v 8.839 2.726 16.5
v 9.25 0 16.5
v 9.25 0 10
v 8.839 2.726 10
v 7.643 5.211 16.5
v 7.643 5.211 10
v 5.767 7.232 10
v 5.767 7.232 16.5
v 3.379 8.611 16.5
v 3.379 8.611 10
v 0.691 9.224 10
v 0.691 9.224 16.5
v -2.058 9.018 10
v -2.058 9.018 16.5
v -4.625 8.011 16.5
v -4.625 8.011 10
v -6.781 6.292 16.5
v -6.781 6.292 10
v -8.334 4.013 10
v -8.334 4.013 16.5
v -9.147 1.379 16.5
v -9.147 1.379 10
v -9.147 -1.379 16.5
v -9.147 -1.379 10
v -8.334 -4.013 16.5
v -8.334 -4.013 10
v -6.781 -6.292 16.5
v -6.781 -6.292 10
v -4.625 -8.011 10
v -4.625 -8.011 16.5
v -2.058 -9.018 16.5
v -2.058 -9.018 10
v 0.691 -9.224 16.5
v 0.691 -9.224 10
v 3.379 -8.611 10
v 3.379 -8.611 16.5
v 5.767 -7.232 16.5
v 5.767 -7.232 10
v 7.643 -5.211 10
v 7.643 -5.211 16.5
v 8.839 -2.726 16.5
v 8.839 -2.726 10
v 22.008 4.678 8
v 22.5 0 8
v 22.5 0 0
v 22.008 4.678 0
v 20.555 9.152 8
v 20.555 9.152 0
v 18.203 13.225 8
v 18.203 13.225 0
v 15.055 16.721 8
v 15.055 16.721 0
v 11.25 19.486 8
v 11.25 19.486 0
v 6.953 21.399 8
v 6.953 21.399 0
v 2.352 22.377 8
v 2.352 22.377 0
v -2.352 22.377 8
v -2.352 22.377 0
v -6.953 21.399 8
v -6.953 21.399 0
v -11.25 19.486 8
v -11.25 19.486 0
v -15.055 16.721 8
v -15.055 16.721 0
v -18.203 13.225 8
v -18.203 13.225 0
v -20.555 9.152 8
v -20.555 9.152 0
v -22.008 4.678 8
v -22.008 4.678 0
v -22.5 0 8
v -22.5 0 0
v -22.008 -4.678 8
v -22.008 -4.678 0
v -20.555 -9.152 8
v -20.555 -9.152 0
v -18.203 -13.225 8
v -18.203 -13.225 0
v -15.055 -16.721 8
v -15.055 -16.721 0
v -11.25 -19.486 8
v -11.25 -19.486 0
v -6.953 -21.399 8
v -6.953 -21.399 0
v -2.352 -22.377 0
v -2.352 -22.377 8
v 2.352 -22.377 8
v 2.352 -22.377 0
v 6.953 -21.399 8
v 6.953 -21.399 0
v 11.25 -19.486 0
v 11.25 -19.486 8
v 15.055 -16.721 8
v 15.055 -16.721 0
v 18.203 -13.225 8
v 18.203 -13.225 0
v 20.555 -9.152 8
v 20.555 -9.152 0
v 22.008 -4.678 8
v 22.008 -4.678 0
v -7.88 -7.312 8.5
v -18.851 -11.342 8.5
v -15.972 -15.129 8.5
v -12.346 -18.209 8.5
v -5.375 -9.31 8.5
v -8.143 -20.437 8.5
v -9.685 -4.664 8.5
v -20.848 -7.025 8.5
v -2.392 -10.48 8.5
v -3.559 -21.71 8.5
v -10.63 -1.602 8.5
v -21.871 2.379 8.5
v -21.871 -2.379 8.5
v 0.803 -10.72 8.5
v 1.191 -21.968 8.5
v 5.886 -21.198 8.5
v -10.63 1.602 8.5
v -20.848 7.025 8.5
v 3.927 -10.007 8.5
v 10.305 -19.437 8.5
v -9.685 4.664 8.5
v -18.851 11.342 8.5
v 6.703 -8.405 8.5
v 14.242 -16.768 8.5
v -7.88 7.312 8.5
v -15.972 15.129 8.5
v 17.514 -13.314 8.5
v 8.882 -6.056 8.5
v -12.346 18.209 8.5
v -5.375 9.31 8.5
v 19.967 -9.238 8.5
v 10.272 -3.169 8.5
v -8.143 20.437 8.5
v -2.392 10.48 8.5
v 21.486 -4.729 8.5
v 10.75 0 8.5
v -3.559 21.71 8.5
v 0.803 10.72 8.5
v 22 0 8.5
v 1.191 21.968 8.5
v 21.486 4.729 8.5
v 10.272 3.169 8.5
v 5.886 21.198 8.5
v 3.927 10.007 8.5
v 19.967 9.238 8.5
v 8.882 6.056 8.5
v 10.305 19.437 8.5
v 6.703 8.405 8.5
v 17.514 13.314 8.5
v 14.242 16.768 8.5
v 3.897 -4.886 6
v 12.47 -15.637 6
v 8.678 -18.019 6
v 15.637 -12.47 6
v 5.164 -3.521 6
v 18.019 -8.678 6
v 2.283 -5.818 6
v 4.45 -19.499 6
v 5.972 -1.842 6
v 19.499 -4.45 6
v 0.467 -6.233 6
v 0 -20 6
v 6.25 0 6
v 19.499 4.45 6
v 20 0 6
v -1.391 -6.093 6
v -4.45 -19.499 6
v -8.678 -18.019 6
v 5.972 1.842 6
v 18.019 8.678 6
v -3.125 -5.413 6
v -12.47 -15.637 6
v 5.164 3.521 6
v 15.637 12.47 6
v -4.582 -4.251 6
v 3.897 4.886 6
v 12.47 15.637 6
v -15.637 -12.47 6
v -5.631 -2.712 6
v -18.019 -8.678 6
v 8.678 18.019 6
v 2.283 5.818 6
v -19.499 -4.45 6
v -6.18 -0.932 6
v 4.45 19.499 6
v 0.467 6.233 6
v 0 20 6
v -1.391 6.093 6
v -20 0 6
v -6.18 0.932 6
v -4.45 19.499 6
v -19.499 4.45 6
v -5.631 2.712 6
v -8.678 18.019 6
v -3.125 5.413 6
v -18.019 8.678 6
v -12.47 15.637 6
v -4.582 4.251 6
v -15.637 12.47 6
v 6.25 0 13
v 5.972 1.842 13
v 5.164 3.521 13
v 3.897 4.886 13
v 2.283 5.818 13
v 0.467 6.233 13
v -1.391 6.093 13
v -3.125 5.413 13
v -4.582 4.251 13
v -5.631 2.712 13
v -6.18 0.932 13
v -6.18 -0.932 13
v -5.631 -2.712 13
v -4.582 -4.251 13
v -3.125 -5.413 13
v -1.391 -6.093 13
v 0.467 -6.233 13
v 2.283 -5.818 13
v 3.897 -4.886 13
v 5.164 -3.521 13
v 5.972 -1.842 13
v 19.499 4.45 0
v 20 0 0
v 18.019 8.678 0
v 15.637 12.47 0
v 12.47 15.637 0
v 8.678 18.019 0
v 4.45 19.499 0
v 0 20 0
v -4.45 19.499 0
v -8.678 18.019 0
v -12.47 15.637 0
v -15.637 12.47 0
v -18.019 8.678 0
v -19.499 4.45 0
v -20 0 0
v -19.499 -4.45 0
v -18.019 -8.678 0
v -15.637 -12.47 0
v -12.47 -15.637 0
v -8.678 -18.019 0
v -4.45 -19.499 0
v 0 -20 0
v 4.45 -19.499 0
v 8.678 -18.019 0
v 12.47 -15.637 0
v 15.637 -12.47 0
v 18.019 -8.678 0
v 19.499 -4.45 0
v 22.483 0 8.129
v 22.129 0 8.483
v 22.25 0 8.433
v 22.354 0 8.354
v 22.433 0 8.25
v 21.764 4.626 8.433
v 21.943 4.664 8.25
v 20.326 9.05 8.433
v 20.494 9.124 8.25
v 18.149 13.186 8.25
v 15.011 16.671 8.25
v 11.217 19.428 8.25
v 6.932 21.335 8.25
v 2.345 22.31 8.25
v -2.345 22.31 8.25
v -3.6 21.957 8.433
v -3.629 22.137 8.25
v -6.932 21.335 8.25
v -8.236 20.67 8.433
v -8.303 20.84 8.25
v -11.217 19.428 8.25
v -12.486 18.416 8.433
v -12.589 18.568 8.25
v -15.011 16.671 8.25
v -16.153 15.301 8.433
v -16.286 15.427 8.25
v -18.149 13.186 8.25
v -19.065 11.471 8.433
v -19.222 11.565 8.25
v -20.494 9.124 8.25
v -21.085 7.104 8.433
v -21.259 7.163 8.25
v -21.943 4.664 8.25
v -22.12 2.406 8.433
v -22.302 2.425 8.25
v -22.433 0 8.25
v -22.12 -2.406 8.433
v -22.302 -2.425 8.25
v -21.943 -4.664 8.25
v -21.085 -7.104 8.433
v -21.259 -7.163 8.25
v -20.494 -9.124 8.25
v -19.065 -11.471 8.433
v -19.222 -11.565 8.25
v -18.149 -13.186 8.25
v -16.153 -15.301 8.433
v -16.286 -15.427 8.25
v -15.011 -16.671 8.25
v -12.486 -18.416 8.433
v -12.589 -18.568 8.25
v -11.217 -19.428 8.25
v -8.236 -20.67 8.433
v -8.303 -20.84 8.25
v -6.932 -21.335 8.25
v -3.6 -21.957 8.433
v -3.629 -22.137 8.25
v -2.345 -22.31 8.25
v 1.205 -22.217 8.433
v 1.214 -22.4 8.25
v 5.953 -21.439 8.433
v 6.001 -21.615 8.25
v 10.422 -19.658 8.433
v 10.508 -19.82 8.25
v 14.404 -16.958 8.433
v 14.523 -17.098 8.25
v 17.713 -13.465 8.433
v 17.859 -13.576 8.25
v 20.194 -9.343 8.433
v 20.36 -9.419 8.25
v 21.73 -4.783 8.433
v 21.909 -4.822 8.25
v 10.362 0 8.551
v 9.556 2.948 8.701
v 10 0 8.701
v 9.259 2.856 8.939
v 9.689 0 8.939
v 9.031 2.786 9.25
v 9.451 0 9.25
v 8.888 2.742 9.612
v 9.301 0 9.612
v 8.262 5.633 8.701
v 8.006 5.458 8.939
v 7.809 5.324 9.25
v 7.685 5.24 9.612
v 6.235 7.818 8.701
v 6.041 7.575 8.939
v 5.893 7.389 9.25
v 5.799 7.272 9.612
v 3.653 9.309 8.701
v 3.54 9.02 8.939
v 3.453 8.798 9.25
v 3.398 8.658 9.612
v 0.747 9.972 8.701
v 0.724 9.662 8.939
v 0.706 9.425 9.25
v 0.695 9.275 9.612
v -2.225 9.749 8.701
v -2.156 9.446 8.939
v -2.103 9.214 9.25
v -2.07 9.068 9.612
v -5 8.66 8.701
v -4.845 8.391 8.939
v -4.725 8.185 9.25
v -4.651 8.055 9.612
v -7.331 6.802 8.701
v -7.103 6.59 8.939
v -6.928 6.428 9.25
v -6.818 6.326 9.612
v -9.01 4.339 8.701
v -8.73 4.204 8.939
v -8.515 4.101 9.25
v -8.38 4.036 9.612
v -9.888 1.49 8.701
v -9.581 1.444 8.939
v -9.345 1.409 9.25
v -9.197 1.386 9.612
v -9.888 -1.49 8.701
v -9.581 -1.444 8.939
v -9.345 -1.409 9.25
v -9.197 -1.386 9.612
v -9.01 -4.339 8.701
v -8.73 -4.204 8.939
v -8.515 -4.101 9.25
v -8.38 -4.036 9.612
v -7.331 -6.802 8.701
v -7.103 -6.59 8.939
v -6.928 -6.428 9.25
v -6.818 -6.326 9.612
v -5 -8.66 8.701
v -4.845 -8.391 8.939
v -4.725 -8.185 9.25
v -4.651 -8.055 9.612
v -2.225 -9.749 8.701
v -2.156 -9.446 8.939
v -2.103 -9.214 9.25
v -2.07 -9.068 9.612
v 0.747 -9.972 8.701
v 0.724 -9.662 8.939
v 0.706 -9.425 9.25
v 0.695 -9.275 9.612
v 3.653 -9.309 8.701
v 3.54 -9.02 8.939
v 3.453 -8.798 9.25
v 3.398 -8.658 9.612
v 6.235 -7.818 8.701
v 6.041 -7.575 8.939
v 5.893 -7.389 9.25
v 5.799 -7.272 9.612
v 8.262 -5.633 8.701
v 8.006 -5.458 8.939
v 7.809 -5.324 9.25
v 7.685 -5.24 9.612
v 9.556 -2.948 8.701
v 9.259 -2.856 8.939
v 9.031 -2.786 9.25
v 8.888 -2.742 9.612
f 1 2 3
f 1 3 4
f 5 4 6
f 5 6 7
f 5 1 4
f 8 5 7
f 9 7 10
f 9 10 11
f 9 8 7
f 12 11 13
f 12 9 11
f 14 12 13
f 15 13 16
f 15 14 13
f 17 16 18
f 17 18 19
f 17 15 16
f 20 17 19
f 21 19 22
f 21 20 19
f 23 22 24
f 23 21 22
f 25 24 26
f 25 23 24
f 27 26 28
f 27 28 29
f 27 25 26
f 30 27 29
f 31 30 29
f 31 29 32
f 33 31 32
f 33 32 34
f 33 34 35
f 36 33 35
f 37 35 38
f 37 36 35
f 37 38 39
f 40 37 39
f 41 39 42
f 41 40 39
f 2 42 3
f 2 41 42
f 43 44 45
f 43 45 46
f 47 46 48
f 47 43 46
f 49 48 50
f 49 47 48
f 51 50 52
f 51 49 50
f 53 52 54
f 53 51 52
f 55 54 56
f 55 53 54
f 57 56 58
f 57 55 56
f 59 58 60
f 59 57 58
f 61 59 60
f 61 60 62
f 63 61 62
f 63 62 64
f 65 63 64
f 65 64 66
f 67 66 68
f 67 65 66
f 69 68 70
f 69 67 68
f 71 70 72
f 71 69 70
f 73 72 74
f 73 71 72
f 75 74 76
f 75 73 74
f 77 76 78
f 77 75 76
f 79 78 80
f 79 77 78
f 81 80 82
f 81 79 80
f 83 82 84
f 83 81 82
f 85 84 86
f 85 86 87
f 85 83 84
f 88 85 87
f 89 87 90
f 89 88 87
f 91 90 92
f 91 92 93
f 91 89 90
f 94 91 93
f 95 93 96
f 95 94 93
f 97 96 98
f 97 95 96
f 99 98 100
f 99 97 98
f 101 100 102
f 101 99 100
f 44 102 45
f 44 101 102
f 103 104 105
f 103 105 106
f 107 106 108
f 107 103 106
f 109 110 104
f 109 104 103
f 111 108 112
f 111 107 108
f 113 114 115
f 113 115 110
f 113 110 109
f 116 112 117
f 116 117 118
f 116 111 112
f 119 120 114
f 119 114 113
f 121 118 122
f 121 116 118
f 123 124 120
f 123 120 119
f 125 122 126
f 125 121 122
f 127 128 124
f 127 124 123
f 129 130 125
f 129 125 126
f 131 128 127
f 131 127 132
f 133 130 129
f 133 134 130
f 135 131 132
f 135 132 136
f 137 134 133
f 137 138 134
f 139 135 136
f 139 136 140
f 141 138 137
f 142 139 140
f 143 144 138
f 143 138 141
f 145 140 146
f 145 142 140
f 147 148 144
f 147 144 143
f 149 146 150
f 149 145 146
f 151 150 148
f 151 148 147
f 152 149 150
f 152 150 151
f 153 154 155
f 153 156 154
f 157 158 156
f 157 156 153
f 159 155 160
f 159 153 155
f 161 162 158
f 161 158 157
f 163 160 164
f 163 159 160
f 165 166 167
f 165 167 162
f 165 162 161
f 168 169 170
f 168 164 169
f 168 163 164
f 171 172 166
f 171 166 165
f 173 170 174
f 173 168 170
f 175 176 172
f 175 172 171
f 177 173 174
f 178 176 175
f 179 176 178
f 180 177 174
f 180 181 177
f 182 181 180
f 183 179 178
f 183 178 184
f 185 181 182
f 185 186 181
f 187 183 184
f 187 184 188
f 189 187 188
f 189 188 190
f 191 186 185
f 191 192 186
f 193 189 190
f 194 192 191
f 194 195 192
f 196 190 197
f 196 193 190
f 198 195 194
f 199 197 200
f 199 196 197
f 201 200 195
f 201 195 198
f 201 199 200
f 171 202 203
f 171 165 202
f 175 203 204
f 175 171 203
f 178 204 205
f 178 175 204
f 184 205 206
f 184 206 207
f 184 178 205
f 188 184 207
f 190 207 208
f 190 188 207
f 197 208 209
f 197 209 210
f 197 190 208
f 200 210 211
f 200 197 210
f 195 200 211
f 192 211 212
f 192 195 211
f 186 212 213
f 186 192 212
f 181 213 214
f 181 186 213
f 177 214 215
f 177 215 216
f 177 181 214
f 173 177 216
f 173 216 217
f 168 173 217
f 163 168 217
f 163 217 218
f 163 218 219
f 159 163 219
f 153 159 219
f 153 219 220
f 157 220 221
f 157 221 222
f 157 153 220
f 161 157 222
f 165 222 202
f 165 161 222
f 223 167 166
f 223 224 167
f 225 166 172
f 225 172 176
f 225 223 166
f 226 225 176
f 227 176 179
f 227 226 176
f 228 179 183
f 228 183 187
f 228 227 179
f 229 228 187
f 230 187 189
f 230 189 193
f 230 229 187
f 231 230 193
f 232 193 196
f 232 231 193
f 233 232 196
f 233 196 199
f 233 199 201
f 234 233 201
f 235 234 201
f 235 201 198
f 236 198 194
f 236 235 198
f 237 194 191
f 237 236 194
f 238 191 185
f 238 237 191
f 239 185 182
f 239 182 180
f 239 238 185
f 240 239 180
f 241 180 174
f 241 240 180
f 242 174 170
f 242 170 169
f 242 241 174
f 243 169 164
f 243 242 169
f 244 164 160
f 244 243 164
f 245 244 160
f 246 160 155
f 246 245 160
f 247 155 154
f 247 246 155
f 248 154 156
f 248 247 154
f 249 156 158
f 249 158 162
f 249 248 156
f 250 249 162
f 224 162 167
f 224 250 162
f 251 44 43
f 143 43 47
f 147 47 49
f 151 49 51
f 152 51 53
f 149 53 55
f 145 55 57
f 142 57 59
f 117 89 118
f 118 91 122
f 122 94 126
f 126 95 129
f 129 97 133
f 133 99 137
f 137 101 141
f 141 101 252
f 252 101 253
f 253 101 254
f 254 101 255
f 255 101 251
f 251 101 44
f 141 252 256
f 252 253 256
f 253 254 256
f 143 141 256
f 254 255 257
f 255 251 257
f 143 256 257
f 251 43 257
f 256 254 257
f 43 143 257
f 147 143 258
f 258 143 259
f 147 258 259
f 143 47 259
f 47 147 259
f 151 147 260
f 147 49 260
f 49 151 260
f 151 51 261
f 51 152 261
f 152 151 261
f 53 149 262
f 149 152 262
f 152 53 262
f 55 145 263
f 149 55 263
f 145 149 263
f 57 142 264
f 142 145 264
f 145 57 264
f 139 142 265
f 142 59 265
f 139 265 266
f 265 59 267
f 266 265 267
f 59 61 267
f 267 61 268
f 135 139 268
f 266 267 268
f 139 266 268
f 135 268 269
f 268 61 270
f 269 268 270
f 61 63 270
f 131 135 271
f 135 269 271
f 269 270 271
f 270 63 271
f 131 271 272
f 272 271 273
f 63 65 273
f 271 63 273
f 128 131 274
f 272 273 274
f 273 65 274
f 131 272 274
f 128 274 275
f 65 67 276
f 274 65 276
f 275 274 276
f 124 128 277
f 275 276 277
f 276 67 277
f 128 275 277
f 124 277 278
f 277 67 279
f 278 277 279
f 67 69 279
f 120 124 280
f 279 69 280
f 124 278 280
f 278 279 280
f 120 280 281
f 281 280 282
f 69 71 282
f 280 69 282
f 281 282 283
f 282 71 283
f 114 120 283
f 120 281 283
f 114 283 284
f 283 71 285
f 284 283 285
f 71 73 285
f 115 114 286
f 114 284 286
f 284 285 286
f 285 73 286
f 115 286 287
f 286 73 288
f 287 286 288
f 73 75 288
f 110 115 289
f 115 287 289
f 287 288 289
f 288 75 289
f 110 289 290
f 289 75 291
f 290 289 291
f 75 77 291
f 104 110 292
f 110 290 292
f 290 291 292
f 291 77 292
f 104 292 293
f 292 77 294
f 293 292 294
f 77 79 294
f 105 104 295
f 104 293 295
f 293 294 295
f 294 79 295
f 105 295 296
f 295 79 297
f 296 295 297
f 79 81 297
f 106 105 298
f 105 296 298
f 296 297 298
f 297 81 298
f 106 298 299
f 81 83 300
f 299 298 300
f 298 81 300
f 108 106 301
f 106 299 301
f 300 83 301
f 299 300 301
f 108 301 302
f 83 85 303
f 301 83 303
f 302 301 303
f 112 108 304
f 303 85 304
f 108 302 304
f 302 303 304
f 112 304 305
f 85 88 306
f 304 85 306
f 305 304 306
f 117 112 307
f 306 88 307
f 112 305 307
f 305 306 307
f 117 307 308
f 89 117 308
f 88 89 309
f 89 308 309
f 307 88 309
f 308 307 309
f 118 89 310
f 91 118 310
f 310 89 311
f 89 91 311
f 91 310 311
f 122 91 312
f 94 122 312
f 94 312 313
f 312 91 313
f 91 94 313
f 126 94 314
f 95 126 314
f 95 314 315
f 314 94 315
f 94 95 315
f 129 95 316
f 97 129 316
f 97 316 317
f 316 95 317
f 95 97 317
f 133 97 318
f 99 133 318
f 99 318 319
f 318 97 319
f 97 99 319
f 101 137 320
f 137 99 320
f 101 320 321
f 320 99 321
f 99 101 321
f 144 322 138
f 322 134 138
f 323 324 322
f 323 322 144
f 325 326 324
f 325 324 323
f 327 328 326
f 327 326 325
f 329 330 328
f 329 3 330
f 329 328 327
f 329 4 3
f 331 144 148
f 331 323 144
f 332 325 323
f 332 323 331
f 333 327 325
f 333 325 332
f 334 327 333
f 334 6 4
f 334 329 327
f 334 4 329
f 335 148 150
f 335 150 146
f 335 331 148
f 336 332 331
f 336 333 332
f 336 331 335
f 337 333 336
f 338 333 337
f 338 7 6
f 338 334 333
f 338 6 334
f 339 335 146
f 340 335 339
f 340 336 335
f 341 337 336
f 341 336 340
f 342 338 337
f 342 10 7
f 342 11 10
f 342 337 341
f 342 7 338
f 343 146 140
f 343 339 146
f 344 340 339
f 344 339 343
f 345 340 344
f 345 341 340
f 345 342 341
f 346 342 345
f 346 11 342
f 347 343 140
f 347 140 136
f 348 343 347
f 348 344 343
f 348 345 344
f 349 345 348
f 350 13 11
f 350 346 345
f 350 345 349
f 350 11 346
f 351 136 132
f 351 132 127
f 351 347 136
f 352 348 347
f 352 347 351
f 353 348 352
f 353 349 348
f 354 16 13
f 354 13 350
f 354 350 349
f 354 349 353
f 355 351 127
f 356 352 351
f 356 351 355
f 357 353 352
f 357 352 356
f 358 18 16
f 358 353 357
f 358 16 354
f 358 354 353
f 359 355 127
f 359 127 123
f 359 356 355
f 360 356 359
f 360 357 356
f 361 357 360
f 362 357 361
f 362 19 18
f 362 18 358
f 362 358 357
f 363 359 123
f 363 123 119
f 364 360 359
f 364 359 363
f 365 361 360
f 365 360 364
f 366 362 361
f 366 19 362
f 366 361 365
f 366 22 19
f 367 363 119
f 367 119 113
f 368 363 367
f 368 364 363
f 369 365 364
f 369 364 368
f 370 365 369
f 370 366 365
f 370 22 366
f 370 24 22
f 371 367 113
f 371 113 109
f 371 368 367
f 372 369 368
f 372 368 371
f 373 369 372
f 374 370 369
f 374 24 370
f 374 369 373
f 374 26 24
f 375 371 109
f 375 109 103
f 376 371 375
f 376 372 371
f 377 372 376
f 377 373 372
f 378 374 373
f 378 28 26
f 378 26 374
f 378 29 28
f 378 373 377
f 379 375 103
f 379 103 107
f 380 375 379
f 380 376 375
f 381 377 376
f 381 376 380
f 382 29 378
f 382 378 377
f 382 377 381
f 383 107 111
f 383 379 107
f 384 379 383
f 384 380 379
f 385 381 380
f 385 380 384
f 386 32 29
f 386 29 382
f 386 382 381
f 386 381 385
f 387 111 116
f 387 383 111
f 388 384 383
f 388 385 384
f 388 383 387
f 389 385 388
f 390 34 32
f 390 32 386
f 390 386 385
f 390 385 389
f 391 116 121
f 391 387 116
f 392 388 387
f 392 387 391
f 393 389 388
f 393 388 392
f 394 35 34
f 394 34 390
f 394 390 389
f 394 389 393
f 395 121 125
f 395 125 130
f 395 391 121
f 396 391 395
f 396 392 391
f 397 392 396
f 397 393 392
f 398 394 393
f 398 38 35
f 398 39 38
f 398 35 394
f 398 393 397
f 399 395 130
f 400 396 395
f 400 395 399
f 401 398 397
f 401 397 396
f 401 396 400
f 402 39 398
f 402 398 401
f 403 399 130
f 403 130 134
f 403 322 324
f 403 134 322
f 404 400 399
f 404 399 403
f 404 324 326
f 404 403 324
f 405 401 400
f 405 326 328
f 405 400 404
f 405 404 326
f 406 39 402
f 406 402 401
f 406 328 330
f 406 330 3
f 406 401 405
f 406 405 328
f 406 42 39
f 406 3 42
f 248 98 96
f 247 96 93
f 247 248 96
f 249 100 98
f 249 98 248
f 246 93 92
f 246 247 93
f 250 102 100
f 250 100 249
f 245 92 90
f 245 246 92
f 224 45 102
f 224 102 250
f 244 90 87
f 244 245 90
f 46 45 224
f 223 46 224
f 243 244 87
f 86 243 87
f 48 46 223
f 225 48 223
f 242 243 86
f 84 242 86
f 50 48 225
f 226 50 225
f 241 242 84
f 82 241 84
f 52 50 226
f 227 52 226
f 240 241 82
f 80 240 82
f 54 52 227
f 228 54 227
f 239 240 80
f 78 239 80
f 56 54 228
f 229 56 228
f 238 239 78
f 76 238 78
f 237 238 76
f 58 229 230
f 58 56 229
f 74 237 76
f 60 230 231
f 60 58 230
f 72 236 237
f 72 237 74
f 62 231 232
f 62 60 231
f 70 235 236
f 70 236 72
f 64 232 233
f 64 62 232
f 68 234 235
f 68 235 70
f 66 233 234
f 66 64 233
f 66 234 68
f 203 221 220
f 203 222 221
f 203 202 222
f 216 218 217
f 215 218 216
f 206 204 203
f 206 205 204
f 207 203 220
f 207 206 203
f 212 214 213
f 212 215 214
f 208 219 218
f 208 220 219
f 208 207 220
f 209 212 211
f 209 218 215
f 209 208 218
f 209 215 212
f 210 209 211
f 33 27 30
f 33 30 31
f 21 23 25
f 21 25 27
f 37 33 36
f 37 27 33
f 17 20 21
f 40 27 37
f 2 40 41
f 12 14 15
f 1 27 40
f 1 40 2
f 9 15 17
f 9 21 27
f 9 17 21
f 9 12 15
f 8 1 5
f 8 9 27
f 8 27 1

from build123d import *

# Parameters (mm, degrees)
F2_R = 1.5
F3_R = 0.5


with BuildPart() as f1:
    # F0 (on Front) → F1 (revolve)
    with BuildSketch(Plane.XZ):
        Polygon((0, 16.5), (0, 13), (6.25, 13), (6.25, 6), (20, 6), (20, 0), (22.5, 0), (22.5, 8.5), (9.25, 8.5), (9.25, 16.5), align=None)
    revolve(axis=Axis((0, 0, 14.75), (0, 0, 1)))

    # F2
    f2_edges = [f1.edges().sort_by_distance(p)[0] for p in [
        (-9.25, 0, 8.5),
    ]]
    fillet(f2_edges, radius=F2_R)

    # F3
    f3_edges = [f1.edges().sort_by_distance(p)[0] for p in [
        (-22.5, 0, 8.5),
    ]]
    fillet(f3_edges, radius=F3_R)


solid = f1.part
